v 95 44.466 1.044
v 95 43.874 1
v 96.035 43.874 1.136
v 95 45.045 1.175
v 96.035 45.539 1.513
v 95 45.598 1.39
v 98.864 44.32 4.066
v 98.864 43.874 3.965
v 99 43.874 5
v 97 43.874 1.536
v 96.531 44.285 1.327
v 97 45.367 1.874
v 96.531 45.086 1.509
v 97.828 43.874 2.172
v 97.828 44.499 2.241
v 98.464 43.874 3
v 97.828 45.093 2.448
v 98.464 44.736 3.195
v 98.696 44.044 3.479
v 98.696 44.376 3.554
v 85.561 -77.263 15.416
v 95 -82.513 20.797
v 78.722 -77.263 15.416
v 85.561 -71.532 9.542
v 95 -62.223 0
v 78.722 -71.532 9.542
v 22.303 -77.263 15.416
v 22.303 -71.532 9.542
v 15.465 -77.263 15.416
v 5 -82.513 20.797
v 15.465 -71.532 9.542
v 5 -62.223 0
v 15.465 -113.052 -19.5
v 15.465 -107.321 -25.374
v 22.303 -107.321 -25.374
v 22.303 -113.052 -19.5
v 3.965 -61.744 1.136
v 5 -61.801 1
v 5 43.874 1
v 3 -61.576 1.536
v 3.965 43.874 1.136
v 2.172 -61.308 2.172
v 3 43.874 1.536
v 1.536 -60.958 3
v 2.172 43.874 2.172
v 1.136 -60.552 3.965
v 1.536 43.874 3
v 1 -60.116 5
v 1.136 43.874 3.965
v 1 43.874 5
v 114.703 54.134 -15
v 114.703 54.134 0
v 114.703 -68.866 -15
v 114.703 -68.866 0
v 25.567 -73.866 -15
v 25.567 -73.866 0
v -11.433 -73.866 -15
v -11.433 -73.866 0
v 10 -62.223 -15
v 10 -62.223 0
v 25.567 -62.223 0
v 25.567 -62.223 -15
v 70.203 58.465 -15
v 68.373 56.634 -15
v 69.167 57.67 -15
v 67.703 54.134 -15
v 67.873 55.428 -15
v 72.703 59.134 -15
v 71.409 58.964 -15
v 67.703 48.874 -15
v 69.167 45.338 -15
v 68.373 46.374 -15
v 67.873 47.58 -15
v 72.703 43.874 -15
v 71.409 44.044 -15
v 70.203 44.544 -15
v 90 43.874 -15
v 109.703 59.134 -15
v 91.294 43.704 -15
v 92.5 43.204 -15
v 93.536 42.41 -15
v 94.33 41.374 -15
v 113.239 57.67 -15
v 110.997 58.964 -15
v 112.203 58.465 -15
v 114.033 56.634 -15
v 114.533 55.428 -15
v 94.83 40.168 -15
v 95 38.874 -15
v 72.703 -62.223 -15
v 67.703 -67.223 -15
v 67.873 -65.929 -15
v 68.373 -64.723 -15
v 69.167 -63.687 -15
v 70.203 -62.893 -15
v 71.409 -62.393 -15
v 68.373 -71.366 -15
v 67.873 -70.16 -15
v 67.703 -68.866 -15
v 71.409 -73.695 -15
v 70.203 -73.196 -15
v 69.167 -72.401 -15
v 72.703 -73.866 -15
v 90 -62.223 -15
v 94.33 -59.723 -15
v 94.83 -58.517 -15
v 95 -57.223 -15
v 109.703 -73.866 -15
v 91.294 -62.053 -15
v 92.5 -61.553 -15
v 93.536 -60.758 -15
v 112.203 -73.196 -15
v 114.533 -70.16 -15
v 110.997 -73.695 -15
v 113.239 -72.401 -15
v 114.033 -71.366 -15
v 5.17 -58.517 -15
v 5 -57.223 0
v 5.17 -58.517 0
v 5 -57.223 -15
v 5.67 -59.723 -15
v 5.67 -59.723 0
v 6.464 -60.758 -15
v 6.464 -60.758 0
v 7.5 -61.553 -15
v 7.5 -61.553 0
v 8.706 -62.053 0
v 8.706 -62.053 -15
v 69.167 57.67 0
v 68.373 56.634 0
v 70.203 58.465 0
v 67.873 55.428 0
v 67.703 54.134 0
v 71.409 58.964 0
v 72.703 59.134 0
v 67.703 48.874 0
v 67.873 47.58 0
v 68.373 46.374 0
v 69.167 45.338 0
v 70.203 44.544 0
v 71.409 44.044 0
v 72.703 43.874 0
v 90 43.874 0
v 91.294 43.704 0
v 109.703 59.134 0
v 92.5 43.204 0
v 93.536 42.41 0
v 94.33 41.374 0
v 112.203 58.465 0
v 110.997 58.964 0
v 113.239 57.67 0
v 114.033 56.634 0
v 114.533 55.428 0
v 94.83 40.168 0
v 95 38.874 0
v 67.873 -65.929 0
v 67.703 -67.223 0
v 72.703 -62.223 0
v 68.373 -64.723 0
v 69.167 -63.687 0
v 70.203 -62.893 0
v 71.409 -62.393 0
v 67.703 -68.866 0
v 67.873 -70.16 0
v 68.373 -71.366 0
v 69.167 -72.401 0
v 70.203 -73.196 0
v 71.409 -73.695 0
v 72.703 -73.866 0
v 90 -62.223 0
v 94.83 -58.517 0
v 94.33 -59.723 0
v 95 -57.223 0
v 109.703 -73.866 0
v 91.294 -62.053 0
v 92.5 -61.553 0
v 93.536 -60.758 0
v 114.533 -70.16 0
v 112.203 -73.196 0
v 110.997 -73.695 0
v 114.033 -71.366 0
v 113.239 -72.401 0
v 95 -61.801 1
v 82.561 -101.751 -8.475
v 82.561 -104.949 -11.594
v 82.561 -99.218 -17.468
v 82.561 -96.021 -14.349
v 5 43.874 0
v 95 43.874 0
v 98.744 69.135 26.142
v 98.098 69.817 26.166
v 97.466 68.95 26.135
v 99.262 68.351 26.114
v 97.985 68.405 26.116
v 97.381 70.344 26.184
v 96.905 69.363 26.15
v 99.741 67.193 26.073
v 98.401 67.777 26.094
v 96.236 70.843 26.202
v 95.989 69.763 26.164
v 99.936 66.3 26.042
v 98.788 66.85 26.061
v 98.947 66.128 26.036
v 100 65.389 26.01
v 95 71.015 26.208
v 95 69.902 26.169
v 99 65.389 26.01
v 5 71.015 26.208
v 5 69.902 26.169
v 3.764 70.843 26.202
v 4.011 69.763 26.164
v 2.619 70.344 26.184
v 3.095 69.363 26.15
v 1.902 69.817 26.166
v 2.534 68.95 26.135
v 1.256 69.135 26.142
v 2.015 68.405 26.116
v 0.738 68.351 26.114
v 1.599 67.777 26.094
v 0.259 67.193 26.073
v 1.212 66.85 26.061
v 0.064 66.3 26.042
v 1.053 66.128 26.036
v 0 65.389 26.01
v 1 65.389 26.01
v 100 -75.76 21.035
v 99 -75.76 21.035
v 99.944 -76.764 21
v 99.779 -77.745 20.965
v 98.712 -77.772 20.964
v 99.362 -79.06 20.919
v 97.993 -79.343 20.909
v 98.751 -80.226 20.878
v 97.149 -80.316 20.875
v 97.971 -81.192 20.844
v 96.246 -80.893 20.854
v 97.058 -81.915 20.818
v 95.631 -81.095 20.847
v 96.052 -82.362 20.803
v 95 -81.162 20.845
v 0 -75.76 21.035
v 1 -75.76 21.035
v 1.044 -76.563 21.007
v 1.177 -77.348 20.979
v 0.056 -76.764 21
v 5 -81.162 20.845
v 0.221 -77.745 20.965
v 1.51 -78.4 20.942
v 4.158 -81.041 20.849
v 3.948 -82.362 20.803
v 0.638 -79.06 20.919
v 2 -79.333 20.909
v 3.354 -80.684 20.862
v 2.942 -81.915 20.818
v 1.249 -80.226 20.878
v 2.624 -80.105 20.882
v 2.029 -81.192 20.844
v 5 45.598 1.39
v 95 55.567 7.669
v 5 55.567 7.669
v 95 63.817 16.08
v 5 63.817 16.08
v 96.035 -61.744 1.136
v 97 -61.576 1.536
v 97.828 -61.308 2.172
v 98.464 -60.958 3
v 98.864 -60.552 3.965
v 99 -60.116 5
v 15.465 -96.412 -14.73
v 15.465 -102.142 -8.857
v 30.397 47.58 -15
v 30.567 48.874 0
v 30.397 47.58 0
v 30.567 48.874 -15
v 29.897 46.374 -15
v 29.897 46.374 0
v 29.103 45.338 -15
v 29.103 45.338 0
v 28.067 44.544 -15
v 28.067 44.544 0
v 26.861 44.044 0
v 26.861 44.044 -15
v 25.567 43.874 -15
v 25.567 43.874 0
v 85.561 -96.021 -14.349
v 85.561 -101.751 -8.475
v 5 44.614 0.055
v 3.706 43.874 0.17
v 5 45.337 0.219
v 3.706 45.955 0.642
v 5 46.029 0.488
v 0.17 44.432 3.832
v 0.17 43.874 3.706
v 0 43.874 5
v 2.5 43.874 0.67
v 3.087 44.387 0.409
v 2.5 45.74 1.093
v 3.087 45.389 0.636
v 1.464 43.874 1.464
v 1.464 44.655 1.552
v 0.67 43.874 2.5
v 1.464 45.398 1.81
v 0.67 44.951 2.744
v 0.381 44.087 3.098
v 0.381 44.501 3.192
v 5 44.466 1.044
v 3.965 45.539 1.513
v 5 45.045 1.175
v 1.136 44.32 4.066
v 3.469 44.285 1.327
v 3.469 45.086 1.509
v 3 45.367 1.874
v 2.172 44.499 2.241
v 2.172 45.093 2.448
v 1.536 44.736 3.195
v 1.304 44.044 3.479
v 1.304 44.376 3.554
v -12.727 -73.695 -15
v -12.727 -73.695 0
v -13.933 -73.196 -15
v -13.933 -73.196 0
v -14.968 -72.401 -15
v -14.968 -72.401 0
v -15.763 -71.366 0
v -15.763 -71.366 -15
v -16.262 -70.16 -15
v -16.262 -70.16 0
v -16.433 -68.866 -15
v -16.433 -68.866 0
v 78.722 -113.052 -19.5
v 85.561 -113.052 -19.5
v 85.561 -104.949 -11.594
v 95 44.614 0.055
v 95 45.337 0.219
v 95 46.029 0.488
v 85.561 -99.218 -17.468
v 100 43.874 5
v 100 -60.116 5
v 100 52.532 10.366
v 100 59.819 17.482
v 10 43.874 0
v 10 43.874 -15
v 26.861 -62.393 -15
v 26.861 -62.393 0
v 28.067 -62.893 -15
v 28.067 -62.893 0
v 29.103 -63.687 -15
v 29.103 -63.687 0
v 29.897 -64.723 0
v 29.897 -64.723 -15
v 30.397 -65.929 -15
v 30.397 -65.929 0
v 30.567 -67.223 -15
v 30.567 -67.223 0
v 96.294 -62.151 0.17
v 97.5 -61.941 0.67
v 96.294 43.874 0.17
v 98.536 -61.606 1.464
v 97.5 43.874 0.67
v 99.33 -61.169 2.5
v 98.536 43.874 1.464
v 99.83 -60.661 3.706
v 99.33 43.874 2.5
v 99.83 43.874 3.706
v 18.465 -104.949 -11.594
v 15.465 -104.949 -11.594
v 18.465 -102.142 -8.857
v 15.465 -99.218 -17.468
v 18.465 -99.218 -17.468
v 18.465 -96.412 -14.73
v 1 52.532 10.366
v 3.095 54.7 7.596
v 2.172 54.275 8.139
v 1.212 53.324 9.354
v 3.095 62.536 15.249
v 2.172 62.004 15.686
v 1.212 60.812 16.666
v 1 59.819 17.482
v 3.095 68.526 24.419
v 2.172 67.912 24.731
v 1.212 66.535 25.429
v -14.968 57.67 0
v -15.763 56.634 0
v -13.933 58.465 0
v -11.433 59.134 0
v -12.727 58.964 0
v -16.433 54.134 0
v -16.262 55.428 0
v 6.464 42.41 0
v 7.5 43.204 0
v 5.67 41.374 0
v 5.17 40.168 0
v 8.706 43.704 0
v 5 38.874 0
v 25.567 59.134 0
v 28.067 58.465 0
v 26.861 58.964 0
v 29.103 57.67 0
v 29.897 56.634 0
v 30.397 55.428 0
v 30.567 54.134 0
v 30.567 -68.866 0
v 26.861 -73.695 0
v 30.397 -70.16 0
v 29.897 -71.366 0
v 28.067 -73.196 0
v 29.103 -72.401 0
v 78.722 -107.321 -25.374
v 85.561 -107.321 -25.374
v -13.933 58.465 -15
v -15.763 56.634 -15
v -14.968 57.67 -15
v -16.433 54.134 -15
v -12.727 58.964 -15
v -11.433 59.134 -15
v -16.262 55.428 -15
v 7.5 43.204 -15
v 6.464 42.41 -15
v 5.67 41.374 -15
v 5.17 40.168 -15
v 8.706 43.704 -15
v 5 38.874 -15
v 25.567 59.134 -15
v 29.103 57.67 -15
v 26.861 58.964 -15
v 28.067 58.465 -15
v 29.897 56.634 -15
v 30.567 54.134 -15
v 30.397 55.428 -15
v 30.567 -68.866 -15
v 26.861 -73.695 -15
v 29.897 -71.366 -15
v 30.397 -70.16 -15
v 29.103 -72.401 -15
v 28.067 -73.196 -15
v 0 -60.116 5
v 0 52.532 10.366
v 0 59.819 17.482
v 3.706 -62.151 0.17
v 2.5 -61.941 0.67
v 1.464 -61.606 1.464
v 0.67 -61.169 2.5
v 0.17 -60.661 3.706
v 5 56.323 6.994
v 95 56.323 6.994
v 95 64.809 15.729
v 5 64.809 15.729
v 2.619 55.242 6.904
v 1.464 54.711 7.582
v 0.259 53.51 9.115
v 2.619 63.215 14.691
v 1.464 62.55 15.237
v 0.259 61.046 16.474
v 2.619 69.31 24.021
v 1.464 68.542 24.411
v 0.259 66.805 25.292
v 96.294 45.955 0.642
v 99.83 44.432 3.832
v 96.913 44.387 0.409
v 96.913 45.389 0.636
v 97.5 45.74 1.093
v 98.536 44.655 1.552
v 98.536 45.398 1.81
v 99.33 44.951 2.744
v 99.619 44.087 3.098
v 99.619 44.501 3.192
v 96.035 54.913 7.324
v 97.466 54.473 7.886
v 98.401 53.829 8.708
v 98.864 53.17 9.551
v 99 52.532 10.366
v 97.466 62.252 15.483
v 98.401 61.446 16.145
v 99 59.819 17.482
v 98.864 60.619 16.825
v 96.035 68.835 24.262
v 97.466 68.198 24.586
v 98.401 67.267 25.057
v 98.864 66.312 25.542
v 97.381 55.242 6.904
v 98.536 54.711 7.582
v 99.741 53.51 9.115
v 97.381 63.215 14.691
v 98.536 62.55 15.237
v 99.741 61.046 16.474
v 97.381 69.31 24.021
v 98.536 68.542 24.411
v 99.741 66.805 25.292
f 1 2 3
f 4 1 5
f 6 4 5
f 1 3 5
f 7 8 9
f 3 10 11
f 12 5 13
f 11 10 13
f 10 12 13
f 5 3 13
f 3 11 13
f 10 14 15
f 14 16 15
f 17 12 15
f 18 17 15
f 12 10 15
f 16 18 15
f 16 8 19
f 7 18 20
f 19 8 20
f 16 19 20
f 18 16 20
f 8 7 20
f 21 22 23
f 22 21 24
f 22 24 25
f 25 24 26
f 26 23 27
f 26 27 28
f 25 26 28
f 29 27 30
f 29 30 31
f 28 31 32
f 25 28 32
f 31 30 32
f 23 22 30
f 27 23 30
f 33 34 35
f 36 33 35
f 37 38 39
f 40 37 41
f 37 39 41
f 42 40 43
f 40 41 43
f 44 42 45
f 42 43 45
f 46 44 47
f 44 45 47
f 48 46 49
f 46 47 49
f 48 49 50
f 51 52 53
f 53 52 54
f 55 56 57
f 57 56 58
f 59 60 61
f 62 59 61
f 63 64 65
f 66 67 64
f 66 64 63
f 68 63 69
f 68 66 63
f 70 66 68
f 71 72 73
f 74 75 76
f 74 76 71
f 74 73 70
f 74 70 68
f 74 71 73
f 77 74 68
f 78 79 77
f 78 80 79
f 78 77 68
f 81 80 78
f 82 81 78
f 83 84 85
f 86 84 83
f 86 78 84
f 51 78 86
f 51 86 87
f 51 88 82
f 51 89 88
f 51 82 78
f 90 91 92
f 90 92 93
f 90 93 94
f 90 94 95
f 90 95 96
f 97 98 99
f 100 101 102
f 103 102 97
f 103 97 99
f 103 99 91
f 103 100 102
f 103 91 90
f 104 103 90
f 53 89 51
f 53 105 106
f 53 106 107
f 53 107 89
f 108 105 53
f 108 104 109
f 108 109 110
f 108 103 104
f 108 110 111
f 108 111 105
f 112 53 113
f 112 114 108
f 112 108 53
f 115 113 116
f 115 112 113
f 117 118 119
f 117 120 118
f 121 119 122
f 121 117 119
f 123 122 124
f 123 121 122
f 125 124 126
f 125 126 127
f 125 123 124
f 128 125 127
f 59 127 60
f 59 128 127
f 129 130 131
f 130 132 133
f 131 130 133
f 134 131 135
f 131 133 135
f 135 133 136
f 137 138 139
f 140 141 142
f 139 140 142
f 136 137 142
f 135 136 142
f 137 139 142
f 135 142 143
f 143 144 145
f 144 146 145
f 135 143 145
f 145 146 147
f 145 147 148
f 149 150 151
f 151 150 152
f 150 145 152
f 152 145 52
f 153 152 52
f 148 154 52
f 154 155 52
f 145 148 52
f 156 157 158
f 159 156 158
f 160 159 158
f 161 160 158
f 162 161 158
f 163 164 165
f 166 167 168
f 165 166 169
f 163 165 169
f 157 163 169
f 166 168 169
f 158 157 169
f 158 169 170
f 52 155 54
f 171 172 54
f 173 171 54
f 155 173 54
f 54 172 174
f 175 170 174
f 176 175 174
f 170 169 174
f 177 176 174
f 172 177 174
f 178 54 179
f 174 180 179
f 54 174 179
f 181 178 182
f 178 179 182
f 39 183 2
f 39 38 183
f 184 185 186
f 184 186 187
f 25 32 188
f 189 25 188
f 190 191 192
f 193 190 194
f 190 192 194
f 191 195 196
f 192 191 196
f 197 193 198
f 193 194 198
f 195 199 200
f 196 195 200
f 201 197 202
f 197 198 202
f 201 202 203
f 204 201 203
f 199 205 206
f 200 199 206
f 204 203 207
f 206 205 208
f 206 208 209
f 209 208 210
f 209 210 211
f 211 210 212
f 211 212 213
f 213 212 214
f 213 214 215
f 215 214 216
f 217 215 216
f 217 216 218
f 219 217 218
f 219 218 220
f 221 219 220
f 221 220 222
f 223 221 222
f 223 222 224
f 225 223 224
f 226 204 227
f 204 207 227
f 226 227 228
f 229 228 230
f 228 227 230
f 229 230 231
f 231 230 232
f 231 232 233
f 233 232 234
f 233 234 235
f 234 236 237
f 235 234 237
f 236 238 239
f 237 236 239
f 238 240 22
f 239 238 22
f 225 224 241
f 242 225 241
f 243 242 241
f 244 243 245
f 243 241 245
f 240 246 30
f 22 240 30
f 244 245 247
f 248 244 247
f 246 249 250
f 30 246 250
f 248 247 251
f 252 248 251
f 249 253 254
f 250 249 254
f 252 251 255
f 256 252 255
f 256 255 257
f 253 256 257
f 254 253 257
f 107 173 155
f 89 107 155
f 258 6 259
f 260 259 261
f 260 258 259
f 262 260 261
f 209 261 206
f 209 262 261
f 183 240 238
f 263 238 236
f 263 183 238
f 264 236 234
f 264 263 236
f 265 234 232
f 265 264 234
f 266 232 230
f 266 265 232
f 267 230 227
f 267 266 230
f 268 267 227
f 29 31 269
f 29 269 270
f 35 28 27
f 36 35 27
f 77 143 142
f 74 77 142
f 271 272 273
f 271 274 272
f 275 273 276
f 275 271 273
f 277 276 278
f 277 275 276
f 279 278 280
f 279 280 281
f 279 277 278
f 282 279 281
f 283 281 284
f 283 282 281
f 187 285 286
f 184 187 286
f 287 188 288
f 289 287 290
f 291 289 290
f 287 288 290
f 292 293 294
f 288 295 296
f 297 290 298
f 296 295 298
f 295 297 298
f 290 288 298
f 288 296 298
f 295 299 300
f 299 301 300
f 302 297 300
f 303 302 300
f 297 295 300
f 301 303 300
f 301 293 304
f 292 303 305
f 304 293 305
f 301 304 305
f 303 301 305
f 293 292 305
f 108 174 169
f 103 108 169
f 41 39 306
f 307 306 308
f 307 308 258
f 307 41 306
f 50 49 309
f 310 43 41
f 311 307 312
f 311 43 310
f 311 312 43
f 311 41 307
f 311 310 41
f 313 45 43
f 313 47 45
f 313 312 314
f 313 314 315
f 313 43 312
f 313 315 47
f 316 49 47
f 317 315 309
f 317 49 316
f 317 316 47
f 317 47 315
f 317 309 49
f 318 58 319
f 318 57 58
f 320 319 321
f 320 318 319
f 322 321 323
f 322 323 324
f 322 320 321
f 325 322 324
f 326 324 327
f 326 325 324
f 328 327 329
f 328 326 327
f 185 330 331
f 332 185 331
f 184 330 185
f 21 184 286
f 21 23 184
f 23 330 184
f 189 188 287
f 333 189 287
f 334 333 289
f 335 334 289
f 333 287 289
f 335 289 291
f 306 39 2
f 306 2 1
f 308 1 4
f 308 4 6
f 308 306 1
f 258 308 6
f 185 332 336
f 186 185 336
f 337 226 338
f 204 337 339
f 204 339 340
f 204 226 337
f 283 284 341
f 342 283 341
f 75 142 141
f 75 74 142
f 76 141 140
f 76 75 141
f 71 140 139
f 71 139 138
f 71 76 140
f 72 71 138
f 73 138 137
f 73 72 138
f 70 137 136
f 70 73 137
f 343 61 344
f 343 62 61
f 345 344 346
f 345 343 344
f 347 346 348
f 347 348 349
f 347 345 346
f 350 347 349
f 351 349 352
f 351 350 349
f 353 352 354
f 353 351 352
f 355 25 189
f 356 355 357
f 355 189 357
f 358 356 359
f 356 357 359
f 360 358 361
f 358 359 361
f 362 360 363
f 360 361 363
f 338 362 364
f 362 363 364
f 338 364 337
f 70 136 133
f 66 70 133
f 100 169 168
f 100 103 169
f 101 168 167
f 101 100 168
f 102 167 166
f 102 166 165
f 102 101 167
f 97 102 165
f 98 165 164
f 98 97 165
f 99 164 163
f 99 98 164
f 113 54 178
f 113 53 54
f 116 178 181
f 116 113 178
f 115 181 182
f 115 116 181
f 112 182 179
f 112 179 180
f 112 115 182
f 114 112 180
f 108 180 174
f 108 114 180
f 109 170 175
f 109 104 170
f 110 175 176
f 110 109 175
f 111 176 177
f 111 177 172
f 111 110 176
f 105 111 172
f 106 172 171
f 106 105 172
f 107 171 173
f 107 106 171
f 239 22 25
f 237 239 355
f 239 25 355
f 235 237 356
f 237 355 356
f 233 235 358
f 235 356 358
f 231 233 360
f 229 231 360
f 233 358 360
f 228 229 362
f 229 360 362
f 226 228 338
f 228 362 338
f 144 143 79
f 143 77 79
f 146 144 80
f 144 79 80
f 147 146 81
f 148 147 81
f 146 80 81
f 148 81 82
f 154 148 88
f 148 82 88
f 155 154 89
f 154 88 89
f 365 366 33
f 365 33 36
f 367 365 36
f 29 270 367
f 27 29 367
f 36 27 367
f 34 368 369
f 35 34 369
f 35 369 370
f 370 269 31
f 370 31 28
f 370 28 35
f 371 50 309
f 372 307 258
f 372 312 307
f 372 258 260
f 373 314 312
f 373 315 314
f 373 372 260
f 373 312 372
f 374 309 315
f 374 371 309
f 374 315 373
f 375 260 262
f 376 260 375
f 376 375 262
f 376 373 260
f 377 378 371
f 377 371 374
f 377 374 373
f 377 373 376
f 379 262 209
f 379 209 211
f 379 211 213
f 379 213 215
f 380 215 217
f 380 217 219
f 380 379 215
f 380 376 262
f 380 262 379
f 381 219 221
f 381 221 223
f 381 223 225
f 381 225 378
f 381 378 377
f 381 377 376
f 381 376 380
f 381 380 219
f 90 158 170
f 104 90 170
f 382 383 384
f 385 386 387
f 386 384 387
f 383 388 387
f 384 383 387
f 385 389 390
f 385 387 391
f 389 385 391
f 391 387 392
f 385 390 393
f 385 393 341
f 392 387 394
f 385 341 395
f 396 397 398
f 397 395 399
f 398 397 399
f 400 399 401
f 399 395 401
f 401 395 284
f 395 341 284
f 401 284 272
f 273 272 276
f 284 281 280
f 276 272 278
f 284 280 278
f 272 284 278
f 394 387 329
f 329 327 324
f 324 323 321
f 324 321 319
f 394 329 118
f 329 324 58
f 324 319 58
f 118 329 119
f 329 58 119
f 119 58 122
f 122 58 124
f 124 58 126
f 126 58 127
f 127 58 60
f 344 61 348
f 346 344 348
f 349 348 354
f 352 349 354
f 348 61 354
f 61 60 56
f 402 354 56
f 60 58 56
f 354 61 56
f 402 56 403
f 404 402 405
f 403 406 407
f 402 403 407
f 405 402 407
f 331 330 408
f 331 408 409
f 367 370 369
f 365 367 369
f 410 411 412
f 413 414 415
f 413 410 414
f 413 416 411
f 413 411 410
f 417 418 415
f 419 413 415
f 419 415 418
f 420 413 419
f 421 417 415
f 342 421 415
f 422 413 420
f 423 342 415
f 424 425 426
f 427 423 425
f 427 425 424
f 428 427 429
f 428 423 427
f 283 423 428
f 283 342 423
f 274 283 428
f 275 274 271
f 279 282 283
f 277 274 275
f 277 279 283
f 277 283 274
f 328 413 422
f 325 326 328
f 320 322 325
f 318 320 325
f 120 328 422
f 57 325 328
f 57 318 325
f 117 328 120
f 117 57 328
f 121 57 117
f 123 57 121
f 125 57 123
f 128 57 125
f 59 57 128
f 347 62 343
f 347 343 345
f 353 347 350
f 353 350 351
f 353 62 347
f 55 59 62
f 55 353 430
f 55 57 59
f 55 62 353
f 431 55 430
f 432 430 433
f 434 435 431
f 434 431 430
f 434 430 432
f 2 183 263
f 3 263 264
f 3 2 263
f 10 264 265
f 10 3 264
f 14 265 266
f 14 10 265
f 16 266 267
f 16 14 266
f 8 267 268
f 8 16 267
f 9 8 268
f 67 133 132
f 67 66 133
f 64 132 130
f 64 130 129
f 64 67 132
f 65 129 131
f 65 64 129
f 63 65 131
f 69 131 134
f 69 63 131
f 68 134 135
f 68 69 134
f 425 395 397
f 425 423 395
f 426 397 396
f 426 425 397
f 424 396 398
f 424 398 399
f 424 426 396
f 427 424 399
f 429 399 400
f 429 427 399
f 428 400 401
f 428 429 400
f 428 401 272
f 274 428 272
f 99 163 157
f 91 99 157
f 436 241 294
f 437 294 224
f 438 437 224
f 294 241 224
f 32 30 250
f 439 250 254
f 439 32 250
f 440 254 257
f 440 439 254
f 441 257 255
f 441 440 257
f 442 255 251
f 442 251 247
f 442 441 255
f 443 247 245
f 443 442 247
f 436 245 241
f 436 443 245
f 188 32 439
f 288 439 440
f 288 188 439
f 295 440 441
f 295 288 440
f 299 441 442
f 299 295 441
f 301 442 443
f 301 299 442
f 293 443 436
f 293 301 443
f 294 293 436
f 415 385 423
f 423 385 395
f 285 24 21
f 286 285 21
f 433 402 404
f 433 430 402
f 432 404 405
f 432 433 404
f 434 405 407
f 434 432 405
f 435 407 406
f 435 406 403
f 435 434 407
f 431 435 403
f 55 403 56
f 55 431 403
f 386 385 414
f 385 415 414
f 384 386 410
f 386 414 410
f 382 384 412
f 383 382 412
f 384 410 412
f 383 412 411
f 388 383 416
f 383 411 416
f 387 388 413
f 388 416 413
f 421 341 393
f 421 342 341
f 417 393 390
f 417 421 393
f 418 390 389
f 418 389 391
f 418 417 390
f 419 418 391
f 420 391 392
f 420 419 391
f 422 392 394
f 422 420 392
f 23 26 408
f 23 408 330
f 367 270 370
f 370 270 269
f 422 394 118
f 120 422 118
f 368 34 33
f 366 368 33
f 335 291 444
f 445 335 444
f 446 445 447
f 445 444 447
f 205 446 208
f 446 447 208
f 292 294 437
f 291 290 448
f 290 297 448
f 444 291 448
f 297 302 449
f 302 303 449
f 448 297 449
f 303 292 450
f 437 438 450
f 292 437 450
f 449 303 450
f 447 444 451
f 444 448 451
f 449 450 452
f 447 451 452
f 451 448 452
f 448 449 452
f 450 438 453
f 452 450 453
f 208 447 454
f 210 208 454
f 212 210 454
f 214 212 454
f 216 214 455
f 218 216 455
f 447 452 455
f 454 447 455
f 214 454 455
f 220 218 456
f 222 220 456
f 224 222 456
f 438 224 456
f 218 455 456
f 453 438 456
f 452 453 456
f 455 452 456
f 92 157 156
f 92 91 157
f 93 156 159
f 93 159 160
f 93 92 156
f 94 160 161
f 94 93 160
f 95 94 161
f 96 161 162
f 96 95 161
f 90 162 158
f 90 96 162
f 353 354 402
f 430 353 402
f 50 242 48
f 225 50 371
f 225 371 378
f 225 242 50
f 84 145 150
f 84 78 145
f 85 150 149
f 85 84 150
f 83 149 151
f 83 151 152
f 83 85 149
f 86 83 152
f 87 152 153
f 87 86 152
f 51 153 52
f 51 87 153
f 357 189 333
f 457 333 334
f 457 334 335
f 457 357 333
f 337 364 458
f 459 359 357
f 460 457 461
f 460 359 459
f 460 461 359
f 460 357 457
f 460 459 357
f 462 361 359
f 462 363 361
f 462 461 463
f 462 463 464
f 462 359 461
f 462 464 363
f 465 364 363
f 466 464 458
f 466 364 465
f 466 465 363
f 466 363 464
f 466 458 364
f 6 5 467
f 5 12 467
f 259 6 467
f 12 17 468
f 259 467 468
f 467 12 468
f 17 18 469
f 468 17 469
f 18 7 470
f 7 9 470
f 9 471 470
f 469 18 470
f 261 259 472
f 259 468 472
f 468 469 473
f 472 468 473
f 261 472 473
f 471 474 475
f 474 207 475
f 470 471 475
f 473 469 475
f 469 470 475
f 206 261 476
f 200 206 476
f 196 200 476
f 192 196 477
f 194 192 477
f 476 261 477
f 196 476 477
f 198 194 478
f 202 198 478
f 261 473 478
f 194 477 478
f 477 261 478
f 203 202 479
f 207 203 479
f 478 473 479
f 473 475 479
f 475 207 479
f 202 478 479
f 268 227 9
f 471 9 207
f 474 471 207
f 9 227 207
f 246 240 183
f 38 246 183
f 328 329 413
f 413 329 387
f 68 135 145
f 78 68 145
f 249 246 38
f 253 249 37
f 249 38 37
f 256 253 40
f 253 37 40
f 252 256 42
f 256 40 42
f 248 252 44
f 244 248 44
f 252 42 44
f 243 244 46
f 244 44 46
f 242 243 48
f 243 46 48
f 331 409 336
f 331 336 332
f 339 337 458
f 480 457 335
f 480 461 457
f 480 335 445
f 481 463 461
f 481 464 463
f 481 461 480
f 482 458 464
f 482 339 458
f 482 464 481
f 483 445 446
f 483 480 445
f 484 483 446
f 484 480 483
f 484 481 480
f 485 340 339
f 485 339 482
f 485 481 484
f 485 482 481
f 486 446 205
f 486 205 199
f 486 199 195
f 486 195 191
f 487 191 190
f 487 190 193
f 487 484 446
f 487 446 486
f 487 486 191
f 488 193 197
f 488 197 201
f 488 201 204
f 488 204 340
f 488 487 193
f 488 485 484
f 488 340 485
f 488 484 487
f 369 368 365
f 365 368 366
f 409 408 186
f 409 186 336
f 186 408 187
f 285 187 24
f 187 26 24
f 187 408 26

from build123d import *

# Parameters (mm, degrees)
F1_DEPTH  = 100
F2_R      = 5
F3_T      = -1
F5_DEPTH  = 15
F6_R      = 5
F6_2_R    = 5
F7_W      = 6.8386495113
F7_H      = 8.2063823938
F8_DEPTH  = 50
F10_DEPTH = 3
F12_DEPTH = 3


with BuildPart() as f1:
    # F0 (on Right) → F1 (new body)
    with BuildSketch(Plane.YZ):
        with BuildLine():
            Line((-62.2228905559, 0), (43.8739794223, 0))
            ThreePointArc((43.8739794223, 0), (44.978569759, 0.1235381486), (46.0285764776, 0.4880479248))
            ThreePointArc((46.0285764776, 0.4880479248), (60.824511036, 11.1110867731), (71.0152611136, 26.2080151588))
            Line((71.0152611136, 26.2080151588), (-82.5129672885, 20.7973290235))
            Line((-82.5129672885, 20.7973290235), (-62.2228905559, 0))
        make_face()
    extrude(amount=F1_DEPTH)

    # F2
    f2_edges = [f1.edges().sort_by_distance(p)[0] for p in [
        (100, -72.367929, 10.398665),
        (100, -9.174456, 0),
        (0, 60.824511, 11.111087),
        (0, -72.367929, 10.398665),
    ]]
    fillet(f2_edges, radius=F2_R)

    # F3
    f3_openings = [f1.faces().sort_by_distance(p)[0] for p in [
        (50, -5.736741, 23.503099),
    ]]
    offset(amount=F3_T, openings=f3_openings)

    # F7 (on face) → F8 (join)
    with BuildSketch(Plane(origin=(0, -31.8795126034, -31.1019629584), x_dir=(1, 0, 0), z_dir=(0, -0.7157819546, -0.6983238457))):
        with Locations((18.8841372728, 60.8858540654)):
            Rectangle(F7_W, F7_H)
        with Locations((82.1416676044, 60.8858540654)):
            Rectangle(F7_W, F7_H)
    extrude(amount=F8_DEPTH)

    # F9 (on face) → F10 (cut)
    with BuildSketch(Plane.YZ.offset(85.5609923601)):
        Polygon((-101.7513151599, -8.475101115), (-104.9485136509, -11.5943190991), (-99.2178011386, -17.4682995294), (-96.0206026476, -14.3490815453), align=None)
    extrude(amount=-F10_DEPTH, mode=Mode.SUBTRACT)

    # F11 (on face) → F12 (cut)
    with BuildSketch(Plane(origin=(15.4648125172, 0, 0), x_dir=(0, -1, 0), z_dir=(-1, 0, 0))):
        Polygon((104.9486428403, -11.5944451375), (102.1422585039, -8.8565092486), (96.4115459916, -14.7304896789), (99.217930328, -17.4684255678), align=None)
    extrude(amount=-F12_DEPTH, mode=Mode.SUBTRACT)


with BuildPart() as f5:
    # F4 (on face) → F5 (new body)
    with BuildSketch(Plane(origin=(0, 0, 0), x_dir=(1, 0, 0), z_dir=(0, 0, -1))):
        Polygon((95, -43.8739794223), (67.7029747336, -43.8739794223), (67.7029747336, -59.1343878611), (114.7029747336, -59.1343878611), (114.7029747336, 73.8656121389), (67.7029747336, 73.8656121389), (67.7029747336, 62.2228905559), (95, 62.2228905559), align=None)
    extrude(amount=F5_DEPTH)

    # F6
    f6_edges = [f5.edges().sort_by_distance(p)[0] for p in [
        (114.702975, -73.865612, -7.5),
        (114.702975, 59.134388, -7.5),
        (67.702975, 59.134388, -7.5),
        (67.702975, -73.865612, -7.5),
        (95, -62.222891, -7.5),
        (95, 43.873979, -7.5),
        (67.702975, 43.873979, -7.5),
        (67.702975, -62.222891, -7.5),
    ]]
    fillet(f6_edges, radius=F6_R)


with BuildPart() as f5b:
    # F4 (on face) → F5, piece 2 (new body)
    with BuildSketch(Plane(origin=(0, 0, 0), x_dir=(1, 0, 0), z_dir=(0, 0, -1))):
        Polygon((-16.4328367253, -59.1343878611), (30.5671632747, -59.1343878611), (30.5671632747, -43.8739794223), (5, -43.8739794223), (5, 62.2228905559), (30.5671632747, 62.2228905559), (30.5671632747, 73.8656121389), (-16.4328367253, 73.8656121389), align=None)
    extrude(amount=F5_DEPTH)

    # F6#2
    f6_2_edges = [f5b.edges().sort_by_distance(p)[0] for p in [
        (-16.432837, -73.865612, -7.5),
        (-16.432837, 59.134388, -7.5),
        (30.567163, 59.134388, -7.5),
        (30.567163, -73.865612, -7.5),
        (5, -62.222891, -7.5),
        (5, 43.873979, -7.5),
        (30.567163, 43.873979, -7.5),
        (30.567163, -62.222891, -7.5),
    ]]
    fillet(f6_2_edges, radius=F6_2_R)


solid = Compound([f1.part, f5.part, f5b.part])
